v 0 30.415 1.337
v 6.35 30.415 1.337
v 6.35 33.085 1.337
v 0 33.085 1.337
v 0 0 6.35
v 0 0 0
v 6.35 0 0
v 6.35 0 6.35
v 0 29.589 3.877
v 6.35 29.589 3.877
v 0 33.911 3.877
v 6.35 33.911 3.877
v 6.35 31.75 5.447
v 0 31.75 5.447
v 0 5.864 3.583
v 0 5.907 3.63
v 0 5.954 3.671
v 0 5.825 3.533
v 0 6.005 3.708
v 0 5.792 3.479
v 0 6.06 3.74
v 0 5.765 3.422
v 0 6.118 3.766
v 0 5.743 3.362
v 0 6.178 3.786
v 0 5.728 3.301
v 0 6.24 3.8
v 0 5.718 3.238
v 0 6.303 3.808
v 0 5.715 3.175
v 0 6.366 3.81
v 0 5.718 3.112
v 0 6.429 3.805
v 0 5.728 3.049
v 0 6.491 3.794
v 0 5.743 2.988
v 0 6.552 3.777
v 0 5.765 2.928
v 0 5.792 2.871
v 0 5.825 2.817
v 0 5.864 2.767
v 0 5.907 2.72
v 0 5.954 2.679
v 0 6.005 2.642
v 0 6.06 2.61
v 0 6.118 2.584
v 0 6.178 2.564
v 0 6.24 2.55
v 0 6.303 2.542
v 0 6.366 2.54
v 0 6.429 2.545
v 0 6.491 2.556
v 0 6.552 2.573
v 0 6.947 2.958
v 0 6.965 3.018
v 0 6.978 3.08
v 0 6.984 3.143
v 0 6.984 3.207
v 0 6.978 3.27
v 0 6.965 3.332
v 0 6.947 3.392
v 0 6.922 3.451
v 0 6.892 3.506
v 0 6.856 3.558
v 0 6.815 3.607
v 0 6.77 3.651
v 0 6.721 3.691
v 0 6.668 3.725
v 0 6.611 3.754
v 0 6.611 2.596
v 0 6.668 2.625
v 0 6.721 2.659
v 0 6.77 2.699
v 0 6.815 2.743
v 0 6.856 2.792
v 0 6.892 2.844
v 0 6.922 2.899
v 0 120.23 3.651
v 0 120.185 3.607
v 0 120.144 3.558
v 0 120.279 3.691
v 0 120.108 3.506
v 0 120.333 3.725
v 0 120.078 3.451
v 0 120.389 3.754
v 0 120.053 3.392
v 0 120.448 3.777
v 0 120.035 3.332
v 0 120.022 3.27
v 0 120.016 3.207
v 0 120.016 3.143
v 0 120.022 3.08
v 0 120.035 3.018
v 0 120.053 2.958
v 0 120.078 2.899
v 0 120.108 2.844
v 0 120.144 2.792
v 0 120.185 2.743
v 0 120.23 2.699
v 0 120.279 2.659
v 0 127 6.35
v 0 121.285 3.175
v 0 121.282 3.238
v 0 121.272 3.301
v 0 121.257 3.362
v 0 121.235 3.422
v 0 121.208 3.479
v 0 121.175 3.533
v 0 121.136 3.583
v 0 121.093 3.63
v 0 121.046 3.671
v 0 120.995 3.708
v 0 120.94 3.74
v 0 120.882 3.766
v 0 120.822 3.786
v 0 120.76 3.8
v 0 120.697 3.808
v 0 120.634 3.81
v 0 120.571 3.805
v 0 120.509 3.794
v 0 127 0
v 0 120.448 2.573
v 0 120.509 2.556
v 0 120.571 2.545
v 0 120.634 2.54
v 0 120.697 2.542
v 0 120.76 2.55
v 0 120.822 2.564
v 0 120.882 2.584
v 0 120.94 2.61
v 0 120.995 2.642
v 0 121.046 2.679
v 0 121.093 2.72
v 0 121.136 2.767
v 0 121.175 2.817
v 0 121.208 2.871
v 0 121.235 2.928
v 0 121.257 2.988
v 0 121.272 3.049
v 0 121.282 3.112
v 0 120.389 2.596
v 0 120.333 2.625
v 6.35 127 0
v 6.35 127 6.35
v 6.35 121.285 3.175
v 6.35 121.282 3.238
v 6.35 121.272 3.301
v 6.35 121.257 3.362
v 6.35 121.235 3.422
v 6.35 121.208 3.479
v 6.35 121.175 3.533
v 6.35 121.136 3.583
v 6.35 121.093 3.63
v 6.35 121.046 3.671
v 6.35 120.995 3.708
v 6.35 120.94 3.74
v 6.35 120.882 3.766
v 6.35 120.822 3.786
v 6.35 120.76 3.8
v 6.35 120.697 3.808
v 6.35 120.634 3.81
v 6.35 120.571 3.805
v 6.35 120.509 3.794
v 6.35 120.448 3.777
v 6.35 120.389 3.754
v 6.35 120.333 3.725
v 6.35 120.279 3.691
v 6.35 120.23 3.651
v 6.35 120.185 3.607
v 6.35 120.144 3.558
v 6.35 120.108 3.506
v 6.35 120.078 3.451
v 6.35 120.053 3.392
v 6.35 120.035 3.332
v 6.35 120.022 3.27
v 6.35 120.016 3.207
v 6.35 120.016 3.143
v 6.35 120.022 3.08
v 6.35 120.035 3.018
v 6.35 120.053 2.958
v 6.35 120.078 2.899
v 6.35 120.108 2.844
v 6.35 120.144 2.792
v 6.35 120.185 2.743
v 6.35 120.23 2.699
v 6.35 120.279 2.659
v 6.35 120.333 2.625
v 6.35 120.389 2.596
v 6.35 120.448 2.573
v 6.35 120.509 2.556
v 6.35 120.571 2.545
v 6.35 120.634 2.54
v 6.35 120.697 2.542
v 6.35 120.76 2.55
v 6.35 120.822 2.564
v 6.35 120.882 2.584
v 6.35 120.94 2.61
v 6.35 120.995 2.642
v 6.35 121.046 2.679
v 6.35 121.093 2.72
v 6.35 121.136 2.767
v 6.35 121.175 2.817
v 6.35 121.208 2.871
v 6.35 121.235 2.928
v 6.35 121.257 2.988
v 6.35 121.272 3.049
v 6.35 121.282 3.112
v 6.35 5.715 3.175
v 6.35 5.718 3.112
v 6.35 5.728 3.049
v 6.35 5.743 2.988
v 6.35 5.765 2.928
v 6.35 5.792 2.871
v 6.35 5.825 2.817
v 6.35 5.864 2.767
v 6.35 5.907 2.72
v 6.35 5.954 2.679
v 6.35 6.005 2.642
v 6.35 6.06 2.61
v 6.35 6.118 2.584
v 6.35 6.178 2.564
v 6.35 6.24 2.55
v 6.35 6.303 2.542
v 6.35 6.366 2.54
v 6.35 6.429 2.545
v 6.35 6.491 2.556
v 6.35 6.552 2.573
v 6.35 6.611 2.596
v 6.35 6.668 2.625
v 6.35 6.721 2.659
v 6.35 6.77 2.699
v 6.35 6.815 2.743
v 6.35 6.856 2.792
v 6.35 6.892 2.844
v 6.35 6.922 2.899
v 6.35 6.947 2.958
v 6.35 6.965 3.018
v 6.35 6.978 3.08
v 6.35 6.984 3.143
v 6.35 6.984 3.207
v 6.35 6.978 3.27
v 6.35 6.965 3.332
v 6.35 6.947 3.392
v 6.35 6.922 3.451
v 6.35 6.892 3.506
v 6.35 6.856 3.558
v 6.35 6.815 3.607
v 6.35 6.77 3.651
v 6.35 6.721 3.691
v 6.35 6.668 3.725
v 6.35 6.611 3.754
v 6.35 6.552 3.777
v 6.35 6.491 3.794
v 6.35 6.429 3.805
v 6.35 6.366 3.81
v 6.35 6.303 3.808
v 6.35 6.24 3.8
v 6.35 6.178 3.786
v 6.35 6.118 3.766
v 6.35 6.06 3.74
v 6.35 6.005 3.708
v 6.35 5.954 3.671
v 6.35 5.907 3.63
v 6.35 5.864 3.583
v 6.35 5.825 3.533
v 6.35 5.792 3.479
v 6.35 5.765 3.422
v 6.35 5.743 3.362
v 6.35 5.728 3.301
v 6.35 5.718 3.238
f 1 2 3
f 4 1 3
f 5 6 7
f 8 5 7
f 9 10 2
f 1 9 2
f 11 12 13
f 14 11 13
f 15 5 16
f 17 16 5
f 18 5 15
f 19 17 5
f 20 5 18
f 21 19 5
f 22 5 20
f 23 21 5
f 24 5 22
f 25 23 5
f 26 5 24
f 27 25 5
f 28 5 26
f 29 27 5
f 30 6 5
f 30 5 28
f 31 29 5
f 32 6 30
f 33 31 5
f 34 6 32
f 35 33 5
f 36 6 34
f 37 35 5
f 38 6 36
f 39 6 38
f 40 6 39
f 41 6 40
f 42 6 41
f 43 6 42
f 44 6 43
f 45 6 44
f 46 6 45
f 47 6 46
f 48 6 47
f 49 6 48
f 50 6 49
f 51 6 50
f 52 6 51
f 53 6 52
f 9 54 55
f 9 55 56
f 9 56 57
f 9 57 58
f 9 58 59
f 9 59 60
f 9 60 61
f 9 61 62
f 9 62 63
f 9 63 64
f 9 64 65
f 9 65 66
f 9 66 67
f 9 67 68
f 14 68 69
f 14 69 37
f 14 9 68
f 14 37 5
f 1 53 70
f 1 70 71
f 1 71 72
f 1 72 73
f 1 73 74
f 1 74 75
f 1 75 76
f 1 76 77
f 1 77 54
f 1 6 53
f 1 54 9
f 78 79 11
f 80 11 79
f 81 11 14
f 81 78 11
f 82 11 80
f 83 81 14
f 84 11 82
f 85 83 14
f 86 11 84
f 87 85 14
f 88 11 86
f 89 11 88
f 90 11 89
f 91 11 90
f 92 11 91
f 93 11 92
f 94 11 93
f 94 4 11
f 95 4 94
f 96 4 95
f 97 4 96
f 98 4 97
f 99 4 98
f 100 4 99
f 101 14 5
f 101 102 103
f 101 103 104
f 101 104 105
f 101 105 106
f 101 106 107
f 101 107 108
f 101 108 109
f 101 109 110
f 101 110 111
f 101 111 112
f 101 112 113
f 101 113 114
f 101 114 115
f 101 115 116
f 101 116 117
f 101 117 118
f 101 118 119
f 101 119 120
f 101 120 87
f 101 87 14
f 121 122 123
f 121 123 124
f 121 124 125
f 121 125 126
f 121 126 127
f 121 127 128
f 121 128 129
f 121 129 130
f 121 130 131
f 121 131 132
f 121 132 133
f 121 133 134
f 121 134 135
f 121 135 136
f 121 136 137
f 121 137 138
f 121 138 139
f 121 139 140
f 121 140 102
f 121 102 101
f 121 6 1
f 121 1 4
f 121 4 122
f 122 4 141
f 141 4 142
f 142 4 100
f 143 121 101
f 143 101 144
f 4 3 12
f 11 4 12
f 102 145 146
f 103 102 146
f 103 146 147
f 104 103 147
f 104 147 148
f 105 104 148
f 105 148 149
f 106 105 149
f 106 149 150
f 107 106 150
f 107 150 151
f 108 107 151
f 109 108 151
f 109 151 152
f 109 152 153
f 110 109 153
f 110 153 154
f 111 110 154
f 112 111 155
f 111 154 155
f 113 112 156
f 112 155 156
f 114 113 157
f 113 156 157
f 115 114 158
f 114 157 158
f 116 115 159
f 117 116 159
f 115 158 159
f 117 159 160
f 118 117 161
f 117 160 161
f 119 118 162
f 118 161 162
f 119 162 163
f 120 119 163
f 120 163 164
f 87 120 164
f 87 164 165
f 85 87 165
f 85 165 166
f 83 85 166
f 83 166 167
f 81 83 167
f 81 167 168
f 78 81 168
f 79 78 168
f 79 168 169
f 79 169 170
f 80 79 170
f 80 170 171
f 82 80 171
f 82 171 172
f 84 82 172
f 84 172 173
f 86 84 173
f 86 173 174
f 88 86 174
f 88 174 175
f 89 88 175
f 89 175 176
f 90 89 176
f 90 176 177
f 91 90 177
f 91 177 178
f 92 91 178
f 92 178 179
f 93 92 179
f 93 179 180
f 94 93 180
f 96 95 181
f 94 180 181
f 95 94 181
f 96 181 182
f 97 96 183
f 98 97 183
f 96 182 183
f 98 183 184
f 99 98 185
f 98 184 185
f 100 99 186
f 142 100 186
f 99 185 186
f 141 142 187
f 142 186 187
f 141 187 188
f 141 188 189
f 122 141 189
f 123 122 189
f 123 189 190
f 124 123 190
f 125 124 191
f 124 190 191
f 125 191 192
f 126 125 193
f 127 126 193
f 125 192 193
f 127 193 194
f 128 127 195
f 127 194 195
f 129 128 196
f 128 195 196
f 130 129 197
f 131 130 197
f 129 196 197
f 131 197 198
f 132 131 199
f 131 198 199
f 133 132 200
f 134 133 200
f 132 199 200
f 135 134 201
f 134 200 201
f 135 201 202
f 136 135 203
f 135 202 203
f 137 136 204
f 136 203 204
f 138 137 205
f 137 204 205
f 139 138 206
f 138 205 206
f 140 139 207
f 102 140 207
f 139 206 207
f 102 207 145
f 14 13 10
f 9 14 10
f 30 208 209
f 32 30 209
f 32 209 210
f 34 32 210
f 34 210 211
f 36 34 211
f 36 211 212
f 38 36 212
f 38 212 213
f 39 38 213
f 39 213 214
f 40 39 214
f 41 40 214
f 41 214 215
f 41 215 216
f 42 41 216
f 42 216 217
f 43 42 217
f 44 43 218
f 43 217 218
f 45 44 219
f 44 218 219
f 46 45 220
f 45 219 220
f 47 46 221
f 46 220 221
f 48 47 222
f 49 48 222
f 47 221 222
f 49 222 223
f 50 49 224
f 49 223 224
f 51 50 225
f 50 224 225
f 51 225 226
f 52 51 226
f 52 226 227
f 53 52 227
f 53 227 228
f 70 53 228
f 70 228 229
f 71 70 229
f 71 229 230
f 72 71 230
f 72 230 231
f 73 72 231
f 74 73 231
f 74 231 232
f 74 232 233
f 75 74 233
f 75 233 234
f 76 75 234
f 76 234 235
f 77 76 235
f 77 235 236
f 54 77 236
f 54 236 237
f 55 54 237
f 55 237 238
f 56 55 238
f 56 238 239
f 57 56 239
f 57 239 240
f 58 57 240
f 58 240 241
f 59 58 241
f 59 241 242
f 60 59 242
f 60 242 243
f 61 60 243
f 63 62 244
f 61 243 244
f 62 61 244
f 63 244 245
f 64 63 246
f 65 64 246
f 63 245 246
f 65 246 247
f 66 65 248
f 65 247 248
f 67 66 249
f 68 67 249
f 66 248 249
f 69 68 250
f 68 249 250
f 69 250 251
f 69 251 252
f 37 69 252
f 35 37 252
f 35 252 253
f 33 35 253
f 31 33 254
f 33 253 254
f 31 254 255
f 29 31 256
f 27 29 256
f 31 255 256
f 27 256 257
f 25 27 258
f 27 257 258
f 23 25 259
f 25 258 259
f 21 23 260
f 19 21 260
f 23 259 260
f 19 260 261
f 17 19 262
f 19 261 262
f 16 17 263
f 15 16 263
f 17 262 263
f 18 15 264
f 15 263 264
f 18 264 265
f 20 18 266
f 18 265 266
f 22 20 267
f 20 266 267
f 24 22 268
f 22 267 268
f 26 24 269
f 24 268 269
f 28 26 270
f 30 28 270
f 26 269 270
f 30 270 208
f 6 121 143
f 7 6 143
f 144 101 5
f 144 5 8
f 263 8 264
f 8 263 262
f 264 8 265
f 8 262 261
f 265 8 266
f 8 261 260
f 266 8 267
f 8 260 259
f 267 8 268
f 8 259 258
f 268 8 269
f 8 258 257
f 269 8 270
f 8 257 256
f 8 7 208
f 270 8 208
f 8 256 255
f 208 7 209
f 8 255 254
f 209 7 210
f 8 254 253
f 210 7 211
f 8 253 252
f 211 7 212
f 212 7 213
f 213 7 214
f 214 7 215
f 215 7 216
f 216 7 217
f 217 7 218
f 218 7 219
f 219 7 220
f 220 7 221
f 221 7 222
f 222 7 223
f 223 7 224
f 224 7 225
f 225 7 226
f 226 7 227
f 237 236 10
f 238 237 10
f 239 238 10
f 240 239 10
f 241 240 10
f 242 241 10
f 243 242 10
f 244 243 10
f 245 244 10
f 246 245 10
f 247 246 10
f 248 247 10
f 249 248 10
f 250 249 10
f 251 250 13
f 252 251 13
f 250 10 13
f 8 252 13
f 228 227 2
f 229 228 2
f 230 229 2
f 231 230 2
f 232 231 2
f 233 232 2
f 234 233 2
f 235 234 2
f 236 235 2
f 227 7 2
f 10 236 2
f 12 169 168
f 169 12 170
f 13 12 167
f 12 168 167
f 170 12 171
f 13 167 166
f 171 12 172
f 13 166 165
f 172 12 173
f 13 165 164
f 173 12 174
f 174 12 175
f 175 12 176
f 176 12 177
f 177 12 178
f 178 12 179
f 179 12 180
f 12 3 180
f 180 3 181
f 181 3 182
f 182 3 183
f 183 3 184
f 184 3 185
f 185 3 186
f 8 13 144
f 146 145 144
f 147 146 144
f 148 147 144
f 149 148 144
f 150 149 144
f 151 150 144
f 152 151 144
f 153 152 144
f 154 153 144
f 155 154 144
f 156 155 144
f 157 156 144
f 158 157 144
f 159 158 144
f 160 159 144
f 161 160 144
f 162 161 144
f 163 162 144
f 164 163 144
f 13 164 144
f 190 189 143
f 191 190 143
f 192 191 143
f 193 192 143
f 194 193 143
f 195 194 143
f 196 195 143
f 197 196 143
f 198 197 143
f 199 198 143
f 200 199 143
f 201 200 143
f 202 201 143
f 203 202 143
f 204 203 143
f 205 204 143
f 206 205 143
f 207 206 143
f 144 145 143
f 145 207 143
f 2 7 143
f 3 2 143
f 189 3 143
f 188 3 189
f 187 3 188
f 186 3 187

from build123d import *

# Parameters (mm, degrees)
F0_W     = 6.35
F0_H     = 127
F1_DEPTH = 6.35
F2_R     = 0.635
F3_DEPTH = 6.351


with BuildPart() as f1:
    # F0 (on Top) → F1 (new body)
    with BuildSketch(Plane.XY):
        with Locations((3.175, 63.5)):
            Rectangle(F0_W, F0_H)
    extrude(amount=F1_DEPTH)

    # F2 (on face) → F3 (cut, through all)
    with BuildSketch(Plane.YZ.offset(6.35)):
        with BuildLine():
            ThreePointArc((6.985, 3.175), (6.35, 3.81), (5.715, 3.175))
            ThreePointArc((5.715, 3.175), (6.35, 2.54), (6.985, 3.175))
        make_face()
        Polygon((33.085357, 1.337039), (33.910653, 3.877039), (31.75, 5.446845), (29.589347, 3.877039), (30.414643, 1.337039), align=None)
        with Locations((120.65, 3.175)):
            Circle(F2_R)
    extrude(amount=-F3_DEPTH, mode=Mode.SUBTRACT)


solid = f1.part
